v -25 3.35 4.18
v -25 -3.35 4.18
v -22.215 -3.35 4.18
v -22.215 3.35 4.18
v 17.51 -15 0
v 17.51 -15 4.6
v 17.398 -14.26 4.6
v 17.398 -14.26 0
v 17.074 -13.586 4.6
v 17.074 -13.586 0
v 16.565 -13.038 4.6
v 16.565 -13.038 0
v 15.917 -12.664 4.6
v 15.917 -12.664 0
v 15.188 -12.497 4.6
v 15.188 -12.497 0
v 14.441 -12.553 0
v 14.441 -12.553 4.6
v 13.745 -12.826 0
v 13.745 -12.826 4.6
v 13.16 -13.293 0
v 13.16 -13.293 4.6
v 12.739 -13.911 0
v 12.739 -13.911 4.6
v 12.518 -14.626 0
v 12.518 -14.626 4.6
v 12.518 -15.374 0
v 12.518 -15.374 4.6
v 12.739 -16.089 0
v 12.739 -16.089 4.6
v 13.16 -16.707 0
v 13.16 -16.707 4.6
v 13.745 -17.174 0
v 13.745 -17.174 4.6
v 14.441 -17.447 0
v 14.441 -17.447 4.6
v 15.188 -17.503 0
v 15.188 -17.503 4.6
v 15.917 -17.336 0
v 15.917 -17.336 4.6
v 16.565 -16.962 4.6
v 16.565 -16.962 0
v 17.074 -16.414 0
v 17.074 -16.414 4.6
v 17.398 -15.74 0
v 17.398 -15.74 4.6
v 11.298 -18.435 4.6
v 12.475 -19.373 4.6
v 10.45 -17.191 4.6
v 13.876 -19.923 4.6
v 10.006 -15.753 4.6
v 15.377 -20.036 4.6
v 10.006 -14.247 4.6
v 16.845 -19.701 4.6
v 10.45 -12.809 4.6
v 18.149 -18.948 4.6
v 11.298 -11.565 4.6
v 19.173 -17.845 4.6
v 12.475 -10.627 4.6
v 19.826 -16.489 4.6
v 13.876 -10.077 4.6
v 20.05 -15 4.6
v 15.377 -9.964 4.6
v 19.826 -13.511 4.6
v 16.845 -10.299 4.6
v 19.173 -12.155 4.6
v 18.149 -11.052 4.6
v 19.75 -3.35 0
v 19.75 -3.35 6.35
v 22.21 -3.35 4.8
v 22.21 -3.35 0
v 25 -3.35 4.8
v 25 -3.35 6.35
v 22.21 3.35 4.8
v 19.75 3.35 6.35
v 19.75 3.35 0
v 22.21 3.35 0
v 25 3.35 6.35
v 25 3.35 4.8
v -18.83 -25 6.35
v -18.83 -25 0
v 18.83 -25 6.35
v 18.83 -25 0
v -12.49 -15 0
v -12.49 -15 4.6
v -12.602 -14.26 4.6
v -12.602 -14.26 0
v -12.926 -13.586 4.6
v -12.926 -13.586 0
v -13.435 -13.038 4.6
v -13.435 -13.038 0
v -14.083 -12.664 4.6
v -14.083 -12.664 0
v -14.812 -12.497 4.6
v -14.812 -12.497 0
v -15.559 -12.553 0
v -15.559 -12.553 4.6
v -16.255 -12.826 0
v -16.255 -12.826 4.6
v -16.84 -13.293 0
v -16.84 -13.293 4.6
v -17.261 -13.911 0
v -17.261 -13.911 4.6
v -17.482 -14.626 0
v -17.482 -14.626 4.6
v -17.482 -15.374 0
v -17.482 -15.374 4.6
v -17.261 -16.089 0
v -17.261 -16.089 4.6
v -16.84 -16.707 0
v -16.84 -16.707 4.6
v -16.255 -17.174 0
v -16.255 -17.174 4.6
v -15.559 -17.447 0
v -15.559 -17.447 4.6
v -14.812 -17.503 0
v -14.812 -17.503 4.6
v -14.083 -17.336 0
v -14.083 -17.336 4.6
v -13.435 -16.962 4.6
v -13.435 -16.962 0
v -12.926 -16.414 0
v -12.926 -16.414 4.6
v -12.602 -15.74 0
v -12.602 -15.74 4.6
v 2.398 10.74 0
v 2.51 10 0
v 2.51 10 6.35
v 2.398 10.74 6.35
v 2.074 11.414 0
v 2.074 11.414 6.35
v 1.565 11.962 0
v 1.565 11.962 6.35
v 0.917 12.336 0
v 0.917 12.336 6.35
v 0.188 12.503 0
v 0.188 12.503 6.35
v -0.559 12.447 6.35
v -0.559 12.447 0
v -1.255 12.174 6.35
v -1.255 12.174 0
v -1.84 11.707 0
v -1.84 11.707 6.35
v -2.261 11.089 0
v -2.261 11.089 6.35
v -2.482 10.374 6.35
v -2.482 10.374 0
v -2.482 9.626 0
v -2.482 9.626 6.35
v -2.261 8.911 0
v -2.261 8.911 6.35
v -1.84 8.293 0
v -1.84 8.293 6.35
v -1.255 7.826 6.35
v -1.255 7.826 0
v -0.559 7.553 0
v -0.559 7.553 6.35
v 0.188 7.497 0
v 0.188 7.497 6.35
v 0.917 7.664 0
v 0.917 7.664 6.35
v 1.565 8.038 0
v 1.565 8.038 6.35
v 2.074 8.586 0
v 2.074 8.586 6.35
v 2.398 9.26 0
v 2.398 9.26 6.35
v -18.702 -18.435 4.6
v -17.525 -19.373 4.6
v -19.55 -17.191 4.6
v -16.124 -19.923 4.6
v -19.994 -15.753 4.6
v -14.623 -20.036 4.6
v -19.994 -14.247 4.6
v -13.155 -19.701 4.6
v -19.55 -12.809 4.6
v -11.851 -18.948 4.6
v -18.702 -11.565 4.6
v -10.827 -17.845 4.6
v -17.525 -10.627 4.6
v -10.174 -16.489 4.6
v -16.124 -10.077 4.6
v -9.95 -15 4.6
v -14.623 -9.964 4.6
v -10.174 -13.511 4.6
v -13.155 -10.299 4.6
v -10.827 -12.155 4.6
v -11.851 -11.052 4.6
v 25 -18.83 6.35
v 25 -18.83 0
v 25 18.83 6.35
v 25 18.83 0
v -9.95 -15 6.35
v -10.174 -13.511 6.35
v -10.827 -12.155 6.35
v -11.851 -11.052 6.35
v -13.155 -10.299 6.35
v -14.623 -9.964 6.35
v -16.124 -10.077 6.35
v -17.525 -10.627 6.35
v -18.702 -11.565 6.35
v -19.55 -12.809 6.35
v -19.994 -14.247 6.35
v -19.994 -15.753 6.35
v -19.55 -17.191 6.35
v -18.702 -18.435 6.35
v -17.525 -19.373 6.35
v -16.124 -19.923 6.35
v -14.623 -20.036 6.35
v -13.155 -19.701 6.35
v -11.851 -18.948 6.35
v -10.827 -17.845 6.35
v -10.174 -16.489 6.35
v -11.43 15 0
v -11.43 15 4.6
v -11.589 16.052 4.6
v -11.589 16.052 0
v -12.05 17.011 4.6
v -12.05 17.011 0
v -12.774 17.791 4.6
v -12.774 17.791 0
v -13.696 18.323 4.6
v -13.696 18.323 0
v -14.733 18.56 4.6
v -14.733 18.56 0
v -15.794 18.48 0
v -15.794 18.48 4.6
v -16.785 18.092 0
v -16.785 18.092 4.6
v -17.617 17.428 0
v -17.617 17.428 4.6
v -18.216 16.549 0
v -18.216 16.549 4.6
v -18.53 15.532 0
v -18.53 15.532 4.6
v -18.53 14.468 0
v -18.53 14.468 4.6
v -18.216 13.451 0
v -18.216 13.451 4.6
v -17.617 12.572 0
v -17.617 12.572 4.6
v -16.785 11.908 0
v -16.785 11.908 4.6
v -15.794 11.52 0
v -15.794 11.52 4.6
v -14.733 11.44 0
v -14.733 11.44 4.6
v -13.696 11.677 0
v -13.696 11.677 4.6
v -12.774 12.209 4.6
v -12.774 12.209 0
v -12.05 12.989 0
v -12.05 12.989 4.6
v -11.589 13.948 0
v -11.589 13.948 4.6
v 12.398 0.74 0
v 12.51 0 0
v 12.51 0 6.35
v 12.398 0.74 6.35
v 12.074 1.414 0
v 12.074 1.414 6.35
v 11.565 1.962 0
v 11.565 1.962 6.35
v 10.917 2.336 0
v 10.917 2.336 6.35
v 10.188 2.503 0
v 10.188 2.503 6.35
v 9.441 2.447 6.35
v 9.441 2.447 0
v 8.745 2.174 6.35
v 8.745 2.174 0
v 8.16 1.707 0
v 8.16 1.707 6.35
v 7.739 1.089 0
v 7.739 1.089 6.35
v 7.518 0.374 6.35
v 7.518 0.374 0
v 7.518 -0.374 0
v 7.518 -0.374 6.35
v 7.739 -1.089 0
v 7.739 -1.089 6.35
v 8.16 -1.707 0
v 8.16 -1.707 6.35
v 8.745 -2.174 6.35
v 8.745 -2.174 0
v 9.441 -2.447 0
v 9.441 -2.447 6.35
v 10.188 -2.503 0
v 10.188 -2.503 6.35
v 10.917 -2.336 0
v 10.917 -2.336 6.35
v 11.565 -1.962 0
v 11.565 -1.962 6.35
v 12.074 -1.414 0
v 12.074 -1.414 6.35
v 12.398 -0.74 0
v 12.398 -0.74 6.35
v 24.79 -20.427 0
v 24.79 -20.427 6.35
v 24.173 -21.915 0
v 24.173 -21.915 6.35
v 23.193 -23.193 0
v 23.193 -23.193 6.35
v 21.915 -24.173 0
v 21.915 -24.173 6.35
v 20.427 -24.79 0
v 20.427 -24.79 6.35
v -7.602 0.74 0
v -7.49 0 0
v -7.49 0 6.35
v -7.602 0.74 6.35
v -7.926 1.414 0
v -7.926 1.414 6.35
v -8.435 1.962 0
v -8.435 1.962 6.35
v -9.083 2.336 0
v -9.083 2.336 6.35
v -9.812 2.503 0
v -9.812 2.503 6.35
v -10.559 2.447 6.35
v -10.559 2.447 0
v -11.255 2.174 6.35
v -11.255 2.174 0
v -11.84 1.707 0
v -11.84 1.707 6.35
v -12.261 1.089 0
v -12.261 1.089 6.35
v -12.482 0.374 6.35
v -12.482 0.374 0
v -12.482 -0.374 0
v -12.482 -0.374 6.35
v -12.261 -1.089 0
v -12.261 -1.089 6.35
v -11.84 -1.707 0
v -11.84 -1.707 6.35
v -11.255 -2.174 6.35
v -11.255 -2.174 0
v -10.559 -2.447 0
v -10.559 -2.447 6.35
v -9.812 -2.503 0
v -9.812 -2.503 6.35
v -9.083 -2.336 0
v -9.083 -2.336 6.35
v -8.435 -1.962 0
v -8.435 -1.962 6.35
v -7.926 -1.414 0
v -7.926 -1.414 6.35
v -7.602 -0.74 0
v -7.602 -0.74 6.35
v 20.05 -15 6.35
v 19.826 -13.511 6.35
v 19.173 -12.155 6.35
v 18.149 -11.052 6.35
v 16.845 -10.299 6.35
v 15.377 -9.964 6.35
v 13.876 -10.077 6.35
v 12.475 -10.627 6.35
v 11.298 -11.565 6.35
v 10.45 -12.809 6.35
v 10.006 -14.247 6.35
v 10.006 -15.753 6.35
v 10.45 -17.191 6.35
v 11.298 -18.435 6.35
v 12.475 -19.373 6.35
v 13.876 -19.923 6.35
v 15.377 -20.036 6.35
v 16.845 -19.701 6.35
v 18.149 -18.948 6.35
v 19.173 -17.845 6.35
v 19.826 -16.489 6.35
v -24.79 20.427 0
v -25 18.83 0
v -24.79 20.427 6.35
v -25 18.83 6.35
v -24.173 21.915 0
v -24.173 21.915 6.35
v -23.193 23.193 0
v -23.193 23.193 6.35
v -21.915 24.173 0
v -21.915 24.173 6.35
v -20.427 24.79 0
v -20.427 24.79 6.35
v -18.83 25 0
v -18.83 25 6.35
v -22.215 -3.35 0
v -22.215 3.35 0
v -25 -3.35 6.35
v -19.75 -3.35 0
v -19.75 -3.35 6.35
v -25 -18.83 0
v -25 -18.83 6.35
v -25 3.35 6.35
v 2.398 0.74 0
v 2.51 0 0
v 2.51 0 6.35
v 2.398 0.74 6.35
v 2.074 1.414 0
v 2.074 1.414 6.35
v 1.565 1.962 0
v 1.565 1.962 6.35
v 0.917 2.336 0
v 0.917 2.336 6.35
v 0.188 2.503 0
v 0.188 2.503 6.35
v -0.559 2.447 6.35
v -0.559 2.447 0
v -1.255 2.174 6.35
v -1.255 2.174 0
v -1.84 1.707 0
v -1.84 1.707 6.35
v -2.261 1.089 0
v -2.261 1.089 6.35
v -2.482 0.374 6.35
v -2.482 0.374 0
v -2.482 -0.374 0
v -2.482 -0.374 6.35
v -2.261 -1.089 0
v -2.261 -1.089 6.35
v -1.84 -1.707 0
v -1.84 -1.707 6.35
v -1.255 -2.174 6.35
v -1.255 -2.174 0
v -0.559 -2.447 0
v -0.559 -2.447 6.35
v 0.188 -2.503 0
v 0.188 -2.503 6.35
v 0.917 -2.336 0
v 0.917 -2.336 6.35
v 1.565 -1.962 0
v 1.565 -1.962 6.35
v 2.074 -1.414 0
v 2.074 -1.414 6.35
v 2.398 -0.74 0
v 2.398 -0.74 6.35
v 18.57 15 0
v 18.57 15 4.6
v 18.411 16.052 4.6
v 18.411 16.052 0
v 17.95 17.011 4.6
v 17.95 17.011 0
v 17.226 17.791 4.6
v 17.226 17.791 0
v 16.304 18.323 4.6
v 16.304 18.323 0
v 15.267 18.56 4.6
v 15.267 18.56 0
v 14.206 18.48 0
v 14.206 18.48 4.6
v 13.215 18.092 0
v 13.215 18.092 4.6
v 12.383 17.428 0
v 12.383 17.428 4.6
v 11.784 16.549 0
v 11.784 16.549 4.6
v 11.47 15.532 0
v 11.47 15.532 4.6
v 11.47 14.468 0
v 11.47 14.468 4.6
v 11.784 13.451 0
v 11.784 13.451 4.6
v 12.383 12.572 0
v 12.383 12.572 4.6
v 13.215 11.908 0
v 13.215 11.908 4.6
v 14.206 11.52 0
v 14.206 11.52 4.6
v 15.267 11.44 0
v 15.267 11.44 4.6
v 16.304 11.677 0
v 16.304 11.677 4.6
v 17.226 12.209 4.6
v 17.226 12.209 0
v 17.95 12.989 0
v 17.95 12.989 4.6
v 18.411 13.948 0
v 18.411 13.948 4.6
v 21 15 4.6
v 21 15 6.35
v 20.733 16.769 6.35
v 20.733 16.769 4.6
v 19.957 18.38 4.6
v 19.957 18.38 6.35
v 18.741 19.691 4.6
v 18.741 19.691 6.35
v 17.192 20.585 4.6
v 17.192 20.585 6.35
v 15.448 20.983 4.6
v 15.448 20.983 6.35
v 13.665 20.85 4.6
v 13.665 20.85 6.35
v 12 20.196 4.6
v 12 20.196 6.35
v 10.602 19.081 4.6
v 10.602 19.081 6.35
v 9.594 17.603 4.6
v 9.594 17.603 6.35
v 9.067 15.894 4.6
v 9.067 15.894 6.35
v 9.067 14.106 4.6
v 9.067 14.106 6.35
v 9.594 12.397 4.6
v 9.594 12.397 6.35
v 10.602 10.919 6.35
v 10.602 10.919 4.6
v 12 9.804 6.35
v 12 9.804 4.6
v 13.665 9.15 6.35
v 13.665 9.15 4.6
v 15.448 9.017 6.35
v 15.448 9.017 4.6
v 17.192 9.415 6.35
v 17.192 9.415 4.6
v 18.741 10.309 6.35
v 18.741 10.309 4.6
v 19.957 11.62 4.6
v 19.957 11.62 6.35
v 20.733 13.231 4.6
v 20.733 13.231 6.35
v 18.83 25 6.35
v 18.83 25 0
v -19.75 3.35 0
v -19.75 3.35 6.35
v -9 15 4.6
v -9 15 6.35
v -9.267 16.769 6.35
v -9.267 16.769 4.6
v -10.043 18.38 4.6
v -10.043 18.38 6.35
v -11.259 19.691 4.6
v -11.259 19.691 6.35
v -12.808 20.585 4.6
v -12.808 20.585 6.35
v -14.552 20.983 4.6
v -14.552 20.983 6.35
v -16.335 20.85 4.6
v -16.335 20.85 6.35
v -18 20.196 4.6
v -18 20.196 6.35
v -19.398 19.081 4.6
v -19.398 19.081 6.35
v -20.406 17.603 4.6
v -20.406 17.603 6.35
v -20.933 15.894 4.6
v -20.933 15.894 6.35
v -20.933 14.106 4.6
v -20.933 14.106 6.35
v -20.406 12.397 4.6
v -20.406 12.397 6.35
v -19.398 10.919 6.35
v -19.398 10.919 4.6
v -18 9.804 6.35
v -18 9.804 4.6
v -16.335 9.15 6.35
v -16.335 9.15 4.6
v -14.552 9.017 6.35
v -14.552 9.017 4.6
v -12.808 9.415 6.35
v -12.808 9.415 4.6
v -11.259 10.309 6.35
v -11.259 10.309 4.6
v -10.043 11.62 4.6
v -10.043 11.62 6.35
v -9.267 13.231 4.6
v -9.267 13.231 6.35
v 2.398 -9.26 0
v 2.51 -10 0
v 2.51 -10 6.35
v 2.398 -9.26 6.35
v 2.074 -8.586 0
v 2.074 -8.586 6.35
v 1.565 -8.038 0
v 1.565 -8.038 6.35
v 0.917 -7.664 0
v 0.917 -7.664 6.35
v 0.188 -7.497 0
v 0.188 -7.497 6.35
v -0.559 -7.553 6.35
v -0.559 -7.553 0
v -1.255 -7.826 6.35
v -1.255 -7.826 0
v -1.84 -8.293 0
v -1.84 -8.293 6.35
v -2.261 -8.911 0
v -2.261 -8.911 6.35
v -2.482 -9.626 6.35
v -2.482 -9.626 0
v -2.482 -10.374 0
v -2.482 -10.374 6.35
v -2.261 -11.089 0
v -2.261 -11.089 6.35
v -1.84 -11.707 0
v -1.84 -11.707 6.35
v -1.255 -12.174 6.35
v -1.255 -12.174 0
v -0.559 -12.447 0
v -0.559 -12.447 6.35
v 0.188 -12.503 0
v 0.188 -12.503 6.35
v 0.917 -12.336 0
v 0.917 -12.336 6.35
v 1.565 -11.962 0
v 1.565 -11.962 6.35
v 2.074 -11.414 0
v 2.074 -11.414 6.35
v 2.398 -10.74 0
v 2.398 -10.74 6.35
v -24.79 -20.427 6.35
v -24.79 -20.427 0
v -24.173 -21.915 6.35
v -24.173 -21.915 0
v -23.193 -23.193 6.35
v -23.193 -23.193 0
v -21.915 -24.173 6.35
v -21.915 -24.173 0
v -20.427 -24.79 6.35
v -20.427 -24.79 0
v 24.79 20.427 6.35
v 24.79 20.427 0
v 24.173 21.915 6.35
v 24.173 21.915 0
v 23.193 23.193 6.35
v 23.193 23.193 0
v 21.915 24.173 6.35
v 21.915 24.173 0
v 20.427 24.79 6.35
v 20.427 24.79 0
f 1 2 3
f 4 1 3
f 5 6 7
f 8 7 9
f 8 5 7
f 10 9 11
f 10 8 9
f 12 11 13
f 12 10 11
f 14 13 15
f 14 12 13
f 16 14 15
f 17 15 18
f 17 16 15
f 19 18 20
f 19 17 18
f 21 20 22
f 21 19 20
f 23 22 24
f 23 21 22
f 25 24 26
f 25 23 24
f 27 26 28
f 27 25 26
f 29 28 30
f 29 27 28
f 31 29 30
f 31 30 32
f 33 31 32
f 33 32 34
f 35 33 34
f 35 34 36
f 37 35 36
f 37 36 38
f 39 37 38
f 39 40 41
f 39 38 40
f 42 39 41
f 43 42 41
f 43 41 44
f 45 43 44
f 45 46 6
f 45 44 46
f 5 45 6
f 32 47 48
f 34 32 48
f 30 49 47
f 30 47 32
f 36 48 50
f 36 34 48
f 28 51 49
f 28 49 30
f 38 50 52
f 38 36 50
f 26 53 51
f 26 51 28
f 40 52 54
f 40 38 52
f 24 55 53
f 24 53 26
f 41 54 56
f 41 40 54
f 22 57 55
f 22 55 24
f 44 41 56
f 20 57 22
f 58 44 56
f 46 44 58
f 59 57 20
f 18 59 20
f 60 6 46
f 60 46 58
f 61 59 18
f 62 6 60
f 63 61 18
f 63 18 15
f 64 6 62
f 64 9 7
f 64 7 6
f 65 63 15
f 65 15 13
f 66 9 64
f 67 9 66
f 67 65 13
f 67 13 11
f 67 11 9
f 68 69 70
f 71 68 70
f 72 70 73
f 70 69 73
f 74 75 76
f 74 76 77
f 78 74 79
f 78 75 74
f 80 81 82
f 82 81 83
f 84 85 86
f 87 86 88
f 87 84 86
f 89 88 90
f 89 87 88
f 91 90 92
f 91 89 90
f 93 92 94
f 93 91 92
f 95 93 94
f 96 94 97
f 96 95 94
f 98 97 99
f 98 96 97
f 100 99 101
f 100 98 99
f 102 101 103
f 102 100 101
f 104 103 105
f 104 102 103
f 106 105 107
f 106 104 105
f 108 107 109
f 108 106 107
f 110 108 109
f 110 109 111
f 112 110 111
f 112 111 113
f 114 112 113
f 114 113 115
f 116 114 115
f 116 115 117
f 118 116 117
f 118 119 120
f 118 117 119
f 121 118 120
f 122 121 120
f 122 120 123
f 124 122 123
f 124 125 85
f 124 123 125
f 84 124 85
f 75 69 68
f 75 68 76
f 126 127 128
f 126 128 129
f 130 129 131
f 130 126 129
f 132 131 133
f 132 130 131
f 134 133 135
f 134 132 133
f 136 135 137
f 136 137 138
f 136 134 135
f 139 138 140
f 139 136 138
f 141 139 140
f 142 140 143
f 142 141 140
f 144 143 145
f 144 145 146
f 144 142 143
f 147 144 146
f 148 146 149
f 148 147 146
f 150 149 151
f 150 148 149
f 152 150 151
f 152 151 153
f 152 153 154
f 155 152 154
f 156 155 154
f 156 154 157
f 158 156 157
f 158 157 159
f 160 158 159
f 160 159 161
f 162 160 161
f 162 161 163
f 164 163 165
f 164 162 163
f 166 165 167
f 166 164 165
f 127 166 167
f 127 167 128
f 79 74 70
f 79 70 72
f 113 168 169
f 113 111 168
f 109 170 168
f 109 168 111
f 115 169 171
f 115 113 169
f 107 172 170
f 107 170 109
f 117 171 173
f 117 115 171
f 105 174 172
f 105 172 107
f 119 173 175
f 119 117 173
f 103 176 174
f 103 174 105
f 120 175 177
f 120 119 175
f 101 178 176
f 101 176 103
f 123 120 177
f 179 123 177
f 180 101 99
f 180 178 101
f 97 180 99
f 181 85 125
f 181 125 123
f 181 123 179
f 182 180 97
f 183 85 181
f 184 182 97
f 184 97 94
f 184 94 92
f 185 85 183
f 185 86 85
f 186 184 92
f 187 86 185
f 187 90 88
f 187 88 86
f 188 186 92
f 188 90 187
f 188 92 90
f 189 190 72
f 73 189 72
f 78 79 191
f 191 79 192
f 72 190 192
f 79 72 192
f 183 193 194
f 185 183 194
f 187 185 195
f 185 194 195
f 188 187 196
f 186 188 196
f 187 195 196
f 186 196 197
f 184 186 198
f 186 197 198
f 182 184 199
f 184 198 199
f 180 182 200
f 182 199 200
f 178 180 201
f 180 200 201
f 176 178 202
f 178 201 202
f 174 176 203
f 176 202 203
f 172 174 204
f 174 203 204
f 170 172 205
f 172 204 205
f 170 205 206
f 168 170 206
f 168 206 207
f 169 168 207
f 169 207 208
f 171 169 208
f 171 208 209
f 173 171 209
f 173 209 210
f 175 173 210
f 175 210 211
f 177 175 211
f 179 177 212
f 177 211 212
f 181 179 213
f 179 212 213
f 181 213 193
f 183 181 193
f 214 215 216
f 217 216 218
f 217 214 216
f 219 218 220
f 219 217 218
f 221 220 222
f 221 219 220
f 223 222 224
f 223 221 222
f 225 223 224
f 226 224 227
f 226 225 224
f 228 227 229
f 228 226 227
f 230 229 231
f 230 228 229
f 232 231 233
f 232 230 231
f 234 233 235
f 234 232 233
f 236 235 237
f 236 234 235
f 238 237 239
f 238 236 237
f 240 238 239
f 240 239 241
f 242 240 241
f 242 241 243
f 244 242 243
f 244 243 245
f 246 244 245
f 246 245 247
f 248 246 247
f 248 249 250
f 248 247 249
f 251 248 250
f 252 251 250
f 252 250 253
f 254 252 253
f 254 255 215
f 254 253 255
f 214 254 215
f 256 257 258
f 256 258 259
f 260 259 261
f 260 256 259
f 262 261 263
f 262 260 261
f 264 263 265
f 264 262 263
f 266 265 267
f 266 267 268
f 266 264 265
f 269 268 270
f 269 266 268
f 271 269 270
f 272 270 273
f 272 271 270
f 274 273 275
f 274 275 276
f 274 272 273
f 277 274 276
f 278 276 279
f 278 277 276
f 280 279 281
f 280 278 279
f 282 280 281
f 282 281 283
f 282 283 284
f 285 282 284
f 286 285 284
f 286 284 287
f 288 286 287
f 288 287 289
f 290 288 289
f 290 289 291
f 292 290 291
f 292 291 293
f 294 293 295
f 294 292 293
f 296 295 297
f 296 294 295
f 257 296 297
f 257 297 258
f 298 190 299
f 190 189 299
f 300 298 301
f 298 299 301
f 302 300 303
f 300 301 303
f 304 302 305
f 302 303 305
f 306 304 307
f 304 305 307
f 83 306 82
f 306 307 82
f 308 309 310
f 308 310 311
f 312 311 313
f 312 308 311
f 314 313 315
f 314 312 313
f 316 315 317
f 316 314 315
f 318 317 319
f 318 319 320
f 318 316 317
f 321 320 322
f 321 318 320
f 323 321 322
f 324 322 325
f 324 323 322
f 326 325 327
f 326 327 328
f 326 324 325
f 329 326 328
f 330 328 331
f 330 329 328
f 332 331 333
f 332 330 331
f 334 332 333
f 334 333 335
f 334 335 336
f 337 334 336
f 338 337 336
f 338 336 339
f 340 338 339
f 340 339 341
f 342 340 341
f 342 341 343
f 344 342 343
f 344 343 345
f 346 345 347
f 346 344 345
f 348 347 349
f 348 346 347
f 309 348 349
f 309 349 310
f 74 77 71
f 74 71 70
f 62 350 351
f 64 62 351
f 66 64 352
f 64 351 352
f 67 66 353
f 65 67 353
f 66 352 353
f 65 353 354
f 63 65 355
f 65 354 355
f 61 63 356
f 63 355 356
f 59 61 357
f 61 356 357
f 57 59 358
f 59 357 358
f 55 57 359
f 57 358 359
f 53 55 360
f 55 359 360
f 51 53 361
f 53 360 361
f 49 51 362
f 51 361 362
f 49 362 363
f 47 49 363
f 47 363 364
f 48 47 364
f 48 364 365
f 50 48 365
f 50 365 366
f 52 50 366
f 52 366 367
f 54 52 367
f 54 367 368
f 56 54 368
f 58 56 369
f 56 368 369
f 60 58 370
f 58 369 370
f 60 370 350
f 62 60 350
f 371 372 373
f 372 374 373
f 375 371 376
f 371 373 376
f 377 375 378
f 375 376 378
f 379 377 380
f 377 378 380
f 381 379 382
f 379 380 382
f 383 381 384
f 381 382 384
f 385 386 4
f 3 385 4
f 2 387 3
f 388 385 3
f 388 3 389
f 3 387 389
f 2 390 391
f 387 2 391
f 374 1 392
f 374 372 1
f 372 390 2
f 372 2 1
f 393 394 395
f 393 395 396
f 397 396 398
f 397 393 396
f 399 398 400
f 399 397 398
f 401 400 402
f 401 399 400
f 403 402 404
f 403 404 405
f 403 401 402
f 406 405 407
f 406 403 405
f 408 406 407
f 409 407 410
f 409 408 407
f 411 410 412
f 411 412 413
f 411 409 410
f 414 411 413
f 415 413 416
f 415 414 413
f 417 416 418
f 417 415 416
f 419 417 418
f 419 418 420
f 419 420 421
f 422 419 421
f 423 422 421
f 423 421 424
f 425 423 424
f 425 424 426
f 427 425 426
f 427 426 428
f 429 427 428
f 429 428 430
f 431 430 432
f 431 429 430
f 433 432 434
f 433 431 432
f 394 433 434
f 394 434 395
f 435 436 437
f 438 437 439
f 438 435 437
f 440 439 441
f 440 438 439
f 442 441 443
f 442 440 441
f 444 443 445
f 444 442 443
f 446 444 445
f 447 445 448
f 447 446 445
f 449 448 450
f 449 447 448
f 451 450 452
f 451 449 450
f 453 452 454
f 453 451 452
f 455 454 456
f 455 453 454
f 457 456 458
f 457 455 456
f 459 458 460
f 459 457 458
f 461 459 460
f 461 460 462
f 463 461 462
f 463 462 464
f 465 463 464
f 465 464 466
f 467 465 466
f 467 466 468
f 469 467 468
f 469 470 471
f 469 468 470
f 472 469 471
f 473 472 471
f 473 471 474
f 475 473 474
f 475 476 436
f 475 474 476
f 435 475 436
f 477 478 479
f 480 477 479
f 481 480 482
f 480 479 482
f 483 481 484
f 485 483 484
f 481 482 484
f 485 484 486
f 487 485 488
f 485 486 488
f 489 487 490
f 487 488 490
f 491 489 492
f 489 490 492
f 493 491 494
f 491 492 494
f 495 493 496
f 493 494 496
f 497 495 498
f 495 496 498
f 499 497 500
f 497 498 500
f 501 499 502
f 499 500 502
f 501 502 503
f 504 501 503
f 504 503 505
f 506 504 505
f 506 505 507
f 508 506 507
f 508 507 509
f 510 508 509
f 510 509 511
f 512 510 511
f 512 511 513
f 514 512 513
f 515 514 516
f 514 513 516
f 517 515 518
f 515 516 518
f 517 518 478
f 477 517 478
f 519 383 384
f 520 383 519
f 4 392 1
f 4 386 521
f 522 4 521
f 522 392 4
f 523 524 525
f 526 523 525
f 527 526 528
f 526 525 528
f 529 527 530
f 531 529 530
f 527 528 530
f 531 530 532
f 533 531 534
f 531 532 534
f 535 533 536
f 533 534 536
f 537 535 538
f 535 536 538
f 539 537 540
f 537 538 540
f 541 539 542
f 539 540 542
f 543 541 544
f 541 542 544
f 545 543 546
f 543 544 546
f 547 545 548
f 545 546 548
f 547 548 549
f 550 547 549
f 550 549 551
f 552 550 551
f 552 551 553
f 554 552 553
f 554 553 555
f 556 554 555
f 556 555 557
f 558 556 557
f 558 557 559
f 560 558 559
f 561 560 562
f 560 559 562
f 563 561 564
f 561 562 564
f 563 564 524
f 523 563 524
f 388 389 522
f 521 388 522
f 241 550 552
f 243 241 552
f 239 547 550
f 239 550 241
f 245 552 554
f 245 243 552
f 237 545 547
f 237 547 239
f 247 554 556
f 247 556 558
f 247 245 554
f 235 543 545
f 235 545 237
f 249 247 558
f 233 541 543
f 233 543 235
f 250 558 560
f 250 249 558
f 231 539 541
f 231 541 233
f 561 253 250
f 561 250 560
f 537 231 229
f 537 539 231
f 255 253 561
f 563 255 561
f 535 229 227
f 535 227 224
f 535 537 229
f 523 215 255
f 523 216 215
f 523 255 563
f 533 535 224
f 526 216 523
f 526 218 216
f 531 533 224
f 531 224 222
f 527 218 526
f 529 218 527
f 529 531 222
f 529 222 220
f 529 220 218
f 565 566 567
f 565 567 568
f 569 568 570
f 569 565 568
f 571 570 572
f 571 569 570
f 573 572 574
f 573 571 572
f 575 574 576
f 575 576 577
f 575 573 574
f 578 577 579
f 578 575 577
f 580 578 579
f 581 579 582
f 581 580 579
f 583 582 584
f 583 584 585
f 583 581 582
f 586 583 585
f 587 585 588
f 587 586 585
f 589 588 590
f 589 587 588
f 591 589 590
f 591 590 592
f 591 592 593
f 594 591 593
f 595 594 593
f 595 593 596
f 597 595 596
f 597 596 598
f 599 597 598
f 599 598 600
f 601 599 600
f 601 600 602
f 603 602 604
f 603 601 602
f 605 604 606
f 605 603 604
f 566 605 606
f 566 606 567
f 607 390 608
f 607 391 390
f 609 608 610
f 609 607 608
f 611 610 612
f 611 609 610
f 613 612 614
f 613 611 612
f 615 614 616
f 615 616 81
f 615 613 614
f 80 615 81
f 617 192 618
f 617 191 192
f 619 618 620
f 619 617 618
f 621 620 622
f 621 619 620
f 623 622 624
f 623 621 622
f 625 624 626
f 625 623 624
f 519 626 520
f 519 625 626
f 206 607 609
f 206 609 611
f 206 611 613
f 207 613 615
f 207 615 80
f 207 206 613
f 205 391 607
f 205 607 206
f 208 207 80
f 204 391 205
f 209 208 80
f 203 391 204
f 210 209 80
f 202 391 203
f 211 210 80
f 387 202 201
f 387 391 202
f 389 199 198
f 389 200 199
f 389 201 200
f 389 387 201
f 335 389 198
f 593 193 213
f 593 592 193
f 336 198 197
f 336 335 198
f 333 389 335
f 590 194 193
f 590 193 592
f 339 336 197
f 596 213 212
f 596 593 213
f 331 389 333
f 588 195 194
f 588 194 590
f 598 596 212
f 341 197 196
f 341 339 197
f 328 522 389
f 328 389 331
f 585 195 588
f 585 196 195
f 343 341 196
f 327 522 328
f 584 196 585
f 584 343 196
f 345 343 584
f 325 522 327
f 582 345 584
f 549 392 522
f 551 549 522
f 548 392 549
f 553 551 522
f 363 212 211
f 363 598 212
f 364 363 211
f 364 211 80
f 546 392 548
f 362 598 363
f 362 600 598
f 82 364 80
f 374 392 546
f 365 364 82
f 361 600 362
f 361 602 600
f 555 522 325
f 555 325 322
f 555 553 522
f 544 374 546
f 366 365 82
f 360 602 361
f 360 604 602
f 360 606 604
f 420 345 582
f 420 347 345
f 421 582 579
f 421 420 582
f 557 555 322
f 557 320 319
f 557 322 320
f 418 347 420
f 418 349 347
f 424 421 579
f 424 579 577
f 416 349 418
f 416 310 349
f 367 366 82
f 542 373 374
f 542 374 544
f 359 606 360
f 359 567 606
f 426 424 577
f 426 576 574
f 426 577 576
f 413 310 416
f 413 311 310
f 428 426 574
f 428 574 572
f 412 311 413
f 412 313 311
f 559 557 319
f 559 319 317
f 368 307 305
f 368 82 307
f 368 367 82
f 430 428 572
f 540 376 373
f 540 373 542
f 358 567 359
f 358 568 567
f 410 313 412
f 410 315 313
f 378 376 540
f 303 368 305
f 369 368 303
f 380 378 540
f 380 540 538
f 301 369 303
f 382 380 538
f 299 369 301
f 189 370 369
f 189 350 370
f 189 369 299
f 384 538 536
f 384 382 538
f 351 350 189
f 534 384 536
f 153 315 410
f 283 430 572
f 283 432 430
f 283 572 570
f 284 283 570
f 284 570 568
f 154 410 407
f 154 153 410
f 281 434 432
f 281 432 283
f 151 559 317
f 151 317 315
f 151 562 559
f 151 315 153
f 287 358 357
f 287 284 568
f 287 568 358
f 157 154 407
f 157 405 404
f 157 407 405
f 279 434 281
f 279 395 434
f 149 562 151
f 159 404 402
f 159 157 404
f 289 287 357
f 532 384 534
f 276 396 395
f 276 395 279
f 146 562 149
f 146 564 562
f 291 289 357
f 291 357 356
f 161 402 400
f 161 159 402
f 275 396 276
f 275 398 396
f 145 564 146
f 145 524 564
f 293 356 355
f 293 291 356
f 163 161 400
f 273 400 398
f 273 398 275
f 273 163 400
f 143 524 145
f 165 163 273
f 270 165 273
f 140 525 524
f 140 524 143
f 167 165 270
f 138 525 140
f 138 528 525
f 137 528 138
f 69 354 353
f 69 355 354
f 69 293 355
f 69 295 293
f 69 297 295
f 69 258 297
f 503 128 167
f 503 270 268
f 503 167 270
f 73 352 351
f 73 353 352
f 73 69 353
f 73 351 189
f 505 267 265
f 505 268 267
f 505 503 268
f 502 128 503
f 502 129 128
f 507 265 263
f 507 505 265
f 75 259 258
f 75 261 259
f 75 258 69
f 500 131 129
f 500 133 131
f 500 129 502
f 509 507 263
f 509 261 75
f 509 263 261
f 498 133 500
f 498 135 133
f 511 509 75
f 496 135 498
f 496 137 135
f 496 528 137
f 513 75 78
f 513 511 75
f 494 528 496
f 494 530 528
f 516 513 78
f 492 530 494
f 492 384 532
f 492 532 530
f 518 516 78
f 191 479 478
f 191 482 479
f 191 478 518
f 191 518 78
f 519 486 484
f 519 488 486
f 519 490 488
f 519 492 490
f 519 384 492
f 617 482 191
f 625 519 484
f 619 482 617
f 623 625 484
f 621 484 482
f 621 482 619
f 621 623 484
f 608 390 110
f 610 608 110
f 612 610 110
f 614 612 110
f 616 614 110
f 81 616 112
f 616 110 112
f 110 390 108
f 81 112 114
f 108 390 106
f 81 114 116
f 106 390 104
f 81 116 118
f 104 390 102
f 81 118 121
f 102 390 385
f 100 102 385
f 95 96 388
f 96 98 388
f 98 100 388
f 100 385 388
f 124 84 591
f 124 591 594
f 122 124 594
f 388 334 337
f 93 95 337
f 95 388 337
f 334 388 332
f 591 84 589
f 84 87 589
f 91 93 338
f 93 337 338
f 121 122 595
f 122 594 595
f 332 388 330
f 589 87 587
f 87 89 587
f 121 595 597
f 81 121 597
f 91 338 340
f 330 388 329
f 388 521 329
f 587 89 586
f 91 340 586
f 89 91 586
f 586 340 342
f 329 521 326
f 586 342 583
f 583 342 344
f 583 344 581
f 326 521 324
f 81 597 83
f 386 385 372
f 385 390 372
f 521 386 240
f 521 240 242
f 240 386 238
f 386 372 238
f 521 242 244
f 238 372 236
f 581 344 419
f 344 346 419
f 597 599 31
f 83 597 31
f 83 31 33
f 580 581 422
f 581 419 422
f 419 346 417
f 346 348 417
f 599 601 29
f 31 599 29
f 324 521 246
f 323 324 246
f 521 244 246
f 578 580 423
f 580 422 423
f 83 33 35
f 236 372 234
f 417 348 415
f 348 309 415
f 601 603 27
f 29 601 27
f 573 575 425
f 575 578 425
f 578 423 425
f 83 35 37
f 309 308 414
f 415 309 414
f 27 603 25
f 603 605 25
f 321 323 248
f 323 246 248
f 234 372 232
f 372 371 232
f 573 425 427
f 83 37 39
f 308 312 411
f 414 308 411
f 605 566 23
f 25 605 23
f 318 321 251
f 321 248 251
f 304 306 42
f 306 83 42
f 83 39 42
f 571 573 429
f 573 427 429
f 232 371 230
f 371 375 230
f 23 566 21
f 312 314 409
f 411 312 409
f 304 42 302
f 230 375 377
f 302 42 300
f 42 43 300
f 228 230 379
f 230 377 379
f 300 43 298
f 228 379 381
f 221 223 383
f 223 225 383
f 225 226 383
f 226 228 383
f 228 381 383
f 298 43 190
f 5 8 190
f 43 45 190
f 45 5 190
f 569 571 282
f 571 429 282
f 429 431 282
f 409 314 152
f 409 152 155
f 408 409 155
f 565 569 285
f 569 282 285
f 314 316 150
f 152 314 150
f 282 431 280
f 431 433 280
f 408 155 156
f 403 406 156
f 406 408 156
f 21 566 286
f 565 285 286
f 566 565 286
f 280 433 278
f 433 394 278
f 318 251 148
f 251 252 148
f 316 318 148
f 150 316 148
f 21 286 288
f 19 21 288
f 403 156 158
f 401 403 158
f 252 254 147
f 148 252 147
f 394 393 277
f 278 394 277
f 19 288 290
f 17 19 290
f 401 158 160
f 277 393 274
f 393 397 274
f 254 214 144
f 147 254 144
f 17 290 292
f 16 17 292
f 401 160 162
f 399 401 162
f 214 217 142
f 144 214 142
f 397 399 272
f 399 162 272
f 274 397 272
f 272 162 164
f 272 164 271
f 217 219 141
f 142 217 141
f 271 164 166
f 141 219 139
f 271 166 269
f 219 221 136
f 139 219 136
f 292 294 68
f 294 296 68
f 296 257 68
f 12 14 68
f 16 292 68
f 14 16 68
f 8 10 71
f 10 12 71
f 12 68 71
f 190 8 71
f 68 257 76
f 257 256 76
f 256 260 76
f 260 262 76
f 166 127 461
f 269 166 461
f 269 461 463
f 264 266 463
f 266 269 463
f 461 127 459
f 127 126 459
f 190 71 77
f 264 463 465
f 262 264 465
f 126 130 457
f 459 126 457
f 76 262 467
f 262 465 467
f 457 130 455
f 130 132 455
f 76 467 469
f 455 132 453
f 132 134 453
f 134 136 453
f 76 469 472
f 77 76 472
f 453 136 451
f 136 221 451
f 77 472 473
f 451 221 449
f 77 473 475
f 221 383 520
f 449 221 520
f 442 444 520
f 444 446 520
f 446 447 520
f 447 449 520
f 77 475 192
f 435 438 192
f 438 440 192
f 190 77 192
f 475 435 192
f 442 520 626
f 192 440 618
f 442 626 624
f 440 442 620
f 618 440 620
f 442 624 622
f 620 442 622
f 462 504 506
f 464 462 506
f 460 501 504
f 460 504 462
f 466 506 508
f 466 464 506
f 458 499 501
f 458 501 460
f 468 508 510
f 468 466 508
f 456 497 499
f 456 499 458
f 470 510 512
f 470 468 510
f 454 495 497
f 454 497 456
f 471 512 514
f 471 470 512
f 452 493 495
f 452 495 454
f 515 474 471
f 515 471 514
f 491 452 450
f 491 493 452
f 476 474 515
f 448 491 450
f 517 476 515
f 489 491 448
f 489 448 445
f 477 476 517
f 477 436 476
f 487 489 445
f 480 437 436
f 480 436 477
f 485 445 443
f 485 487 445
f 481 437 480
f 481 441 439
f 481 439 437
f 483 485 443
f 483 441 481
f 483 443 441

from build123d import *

# Parameters (mm, degrees)
SKETCH1_W           = 50
SKETCH1_H           = 50
SKETCH1_R           = 3.57
SKETCH1_R_2         = 2.51
BOSS_EXTRUDE1_DEPTH = 6.35
SKETCH2_R           = 6
SKETCH2_R_2         = 5.05
CUT_EXTRUDE1_DEPTH  = 1.75
SKETCH3_W           = 5.25
SKETCH3_H           = 6.7
CUT_EXTRUDE2_DEPTH  = 7
SKETCH4_W           = 2.785
SKETCH4_H           = 4.18
SKETCH4_W_2         = 2.79
SKETCH4_H_2         = 4.8
BOSS_EXTRUDE3_DEPTH = 6.7
FILLET1_R           = 6.17


with BuildPart() as part:
    # Sketch1 → Boss-Extrude1 (new body)
    with BuildSketch(Plane.XY):
        Rectangle(SKETCH1_W, SKETCH1_H)
        with Locations((-15, 15)):
            Circle(SKETCH1_R, mode=Mode.SUBTRACT)
        with Locations((15, 15)):
            Circle(SKETCH1_R, mode=Mode.SUBTRACT)
        with Locations((15, -15)):
            Circle(SKETCH1_R_2, mode=Mode.SUBTRACT)
        with Locations((-15, -15)):
            Circle(SKETCH1_R_2, mode=Mode.SUBTRACT)
        with Locations((-10, 0)):
            Circle(SKETCH1_R_2, mode=Mode.SUBTRACT)
        with Locations((0, 10)):
            Circle(SKETCH1_R_2, mode=Mode.SUBTRACT)
        with Locations((10, 0)):
            Circle(SKETCH1_R_2, mode=Mode.SUBTRACT)
        with Locations((0, -10)):
            Circle(SKETCH1_R_2, mode=Mode.SUBTRACT)
        Circle(SKETCH1_R_2, mode=Mode.SUBTRACT)
    extrude(amount=BOSS_EXTRUDE1_DEPTH)

    # Sketch2 → Cut-Extrude1 (cut)
    with BuildSketch(Plane.XY.offset(6.35)):
        with Locations((-15, 15)):
            Circle(SKETCH2_R)
        with Locations((15, 15)):
            Circle(SKETCH2_R)
        with Locations((-15, -15)):
            Circle(SKETCH2_R_2)
        with Locations((15, -15)):
            Circle(SKETCH2_R_2)
    extrude(amount=-CUT_EXTRUDE1_DEPTH, mode=Mode.SUBTRACT)

    # Sketch3 → Cut-Extrude2 (cut)
    with BuildSketch(Plane.XY.offset(6.35)):
        with Locations((-22.375, 0)):
            Rectangle(SKETCH3_W, SKETCH3_H)
        with Locations((22.375, 0)):
            Rectangle(SKETCH3_W, SKETCH3_H)
    extrude(amount=-CUT_EXTRUDE2_DEPTH, mode=Mode.SUBTRACT)

    # Sketch4 → Boss-Extrude3 (add)
    with BuildSketch(Plane.XZ.offset(-3.35)):
        with Locations((-23.6075, 2.09)):
            Rectangle(SKETCH4_W, SKETCH4_H)
        with Locations((23.605, 2.4)):
            Rectangle(SKETCH4_W_2, SKETCH4_H_2)
    extrude(amount=BOSS_EXTRUDE3_DEPTH)

    # Fillet1
    fillet1_edges = [part.edges().sort_by_distance(p)[0] for p in [
        (25, -25, 3.175),
        (-25, -25, 3.175),
        (-25, 25, 3.175),
        (25, 25, 3.175),
    ]]
    fillet(fillet1_edges, radius=FILLET1_R)


solid = part.part
